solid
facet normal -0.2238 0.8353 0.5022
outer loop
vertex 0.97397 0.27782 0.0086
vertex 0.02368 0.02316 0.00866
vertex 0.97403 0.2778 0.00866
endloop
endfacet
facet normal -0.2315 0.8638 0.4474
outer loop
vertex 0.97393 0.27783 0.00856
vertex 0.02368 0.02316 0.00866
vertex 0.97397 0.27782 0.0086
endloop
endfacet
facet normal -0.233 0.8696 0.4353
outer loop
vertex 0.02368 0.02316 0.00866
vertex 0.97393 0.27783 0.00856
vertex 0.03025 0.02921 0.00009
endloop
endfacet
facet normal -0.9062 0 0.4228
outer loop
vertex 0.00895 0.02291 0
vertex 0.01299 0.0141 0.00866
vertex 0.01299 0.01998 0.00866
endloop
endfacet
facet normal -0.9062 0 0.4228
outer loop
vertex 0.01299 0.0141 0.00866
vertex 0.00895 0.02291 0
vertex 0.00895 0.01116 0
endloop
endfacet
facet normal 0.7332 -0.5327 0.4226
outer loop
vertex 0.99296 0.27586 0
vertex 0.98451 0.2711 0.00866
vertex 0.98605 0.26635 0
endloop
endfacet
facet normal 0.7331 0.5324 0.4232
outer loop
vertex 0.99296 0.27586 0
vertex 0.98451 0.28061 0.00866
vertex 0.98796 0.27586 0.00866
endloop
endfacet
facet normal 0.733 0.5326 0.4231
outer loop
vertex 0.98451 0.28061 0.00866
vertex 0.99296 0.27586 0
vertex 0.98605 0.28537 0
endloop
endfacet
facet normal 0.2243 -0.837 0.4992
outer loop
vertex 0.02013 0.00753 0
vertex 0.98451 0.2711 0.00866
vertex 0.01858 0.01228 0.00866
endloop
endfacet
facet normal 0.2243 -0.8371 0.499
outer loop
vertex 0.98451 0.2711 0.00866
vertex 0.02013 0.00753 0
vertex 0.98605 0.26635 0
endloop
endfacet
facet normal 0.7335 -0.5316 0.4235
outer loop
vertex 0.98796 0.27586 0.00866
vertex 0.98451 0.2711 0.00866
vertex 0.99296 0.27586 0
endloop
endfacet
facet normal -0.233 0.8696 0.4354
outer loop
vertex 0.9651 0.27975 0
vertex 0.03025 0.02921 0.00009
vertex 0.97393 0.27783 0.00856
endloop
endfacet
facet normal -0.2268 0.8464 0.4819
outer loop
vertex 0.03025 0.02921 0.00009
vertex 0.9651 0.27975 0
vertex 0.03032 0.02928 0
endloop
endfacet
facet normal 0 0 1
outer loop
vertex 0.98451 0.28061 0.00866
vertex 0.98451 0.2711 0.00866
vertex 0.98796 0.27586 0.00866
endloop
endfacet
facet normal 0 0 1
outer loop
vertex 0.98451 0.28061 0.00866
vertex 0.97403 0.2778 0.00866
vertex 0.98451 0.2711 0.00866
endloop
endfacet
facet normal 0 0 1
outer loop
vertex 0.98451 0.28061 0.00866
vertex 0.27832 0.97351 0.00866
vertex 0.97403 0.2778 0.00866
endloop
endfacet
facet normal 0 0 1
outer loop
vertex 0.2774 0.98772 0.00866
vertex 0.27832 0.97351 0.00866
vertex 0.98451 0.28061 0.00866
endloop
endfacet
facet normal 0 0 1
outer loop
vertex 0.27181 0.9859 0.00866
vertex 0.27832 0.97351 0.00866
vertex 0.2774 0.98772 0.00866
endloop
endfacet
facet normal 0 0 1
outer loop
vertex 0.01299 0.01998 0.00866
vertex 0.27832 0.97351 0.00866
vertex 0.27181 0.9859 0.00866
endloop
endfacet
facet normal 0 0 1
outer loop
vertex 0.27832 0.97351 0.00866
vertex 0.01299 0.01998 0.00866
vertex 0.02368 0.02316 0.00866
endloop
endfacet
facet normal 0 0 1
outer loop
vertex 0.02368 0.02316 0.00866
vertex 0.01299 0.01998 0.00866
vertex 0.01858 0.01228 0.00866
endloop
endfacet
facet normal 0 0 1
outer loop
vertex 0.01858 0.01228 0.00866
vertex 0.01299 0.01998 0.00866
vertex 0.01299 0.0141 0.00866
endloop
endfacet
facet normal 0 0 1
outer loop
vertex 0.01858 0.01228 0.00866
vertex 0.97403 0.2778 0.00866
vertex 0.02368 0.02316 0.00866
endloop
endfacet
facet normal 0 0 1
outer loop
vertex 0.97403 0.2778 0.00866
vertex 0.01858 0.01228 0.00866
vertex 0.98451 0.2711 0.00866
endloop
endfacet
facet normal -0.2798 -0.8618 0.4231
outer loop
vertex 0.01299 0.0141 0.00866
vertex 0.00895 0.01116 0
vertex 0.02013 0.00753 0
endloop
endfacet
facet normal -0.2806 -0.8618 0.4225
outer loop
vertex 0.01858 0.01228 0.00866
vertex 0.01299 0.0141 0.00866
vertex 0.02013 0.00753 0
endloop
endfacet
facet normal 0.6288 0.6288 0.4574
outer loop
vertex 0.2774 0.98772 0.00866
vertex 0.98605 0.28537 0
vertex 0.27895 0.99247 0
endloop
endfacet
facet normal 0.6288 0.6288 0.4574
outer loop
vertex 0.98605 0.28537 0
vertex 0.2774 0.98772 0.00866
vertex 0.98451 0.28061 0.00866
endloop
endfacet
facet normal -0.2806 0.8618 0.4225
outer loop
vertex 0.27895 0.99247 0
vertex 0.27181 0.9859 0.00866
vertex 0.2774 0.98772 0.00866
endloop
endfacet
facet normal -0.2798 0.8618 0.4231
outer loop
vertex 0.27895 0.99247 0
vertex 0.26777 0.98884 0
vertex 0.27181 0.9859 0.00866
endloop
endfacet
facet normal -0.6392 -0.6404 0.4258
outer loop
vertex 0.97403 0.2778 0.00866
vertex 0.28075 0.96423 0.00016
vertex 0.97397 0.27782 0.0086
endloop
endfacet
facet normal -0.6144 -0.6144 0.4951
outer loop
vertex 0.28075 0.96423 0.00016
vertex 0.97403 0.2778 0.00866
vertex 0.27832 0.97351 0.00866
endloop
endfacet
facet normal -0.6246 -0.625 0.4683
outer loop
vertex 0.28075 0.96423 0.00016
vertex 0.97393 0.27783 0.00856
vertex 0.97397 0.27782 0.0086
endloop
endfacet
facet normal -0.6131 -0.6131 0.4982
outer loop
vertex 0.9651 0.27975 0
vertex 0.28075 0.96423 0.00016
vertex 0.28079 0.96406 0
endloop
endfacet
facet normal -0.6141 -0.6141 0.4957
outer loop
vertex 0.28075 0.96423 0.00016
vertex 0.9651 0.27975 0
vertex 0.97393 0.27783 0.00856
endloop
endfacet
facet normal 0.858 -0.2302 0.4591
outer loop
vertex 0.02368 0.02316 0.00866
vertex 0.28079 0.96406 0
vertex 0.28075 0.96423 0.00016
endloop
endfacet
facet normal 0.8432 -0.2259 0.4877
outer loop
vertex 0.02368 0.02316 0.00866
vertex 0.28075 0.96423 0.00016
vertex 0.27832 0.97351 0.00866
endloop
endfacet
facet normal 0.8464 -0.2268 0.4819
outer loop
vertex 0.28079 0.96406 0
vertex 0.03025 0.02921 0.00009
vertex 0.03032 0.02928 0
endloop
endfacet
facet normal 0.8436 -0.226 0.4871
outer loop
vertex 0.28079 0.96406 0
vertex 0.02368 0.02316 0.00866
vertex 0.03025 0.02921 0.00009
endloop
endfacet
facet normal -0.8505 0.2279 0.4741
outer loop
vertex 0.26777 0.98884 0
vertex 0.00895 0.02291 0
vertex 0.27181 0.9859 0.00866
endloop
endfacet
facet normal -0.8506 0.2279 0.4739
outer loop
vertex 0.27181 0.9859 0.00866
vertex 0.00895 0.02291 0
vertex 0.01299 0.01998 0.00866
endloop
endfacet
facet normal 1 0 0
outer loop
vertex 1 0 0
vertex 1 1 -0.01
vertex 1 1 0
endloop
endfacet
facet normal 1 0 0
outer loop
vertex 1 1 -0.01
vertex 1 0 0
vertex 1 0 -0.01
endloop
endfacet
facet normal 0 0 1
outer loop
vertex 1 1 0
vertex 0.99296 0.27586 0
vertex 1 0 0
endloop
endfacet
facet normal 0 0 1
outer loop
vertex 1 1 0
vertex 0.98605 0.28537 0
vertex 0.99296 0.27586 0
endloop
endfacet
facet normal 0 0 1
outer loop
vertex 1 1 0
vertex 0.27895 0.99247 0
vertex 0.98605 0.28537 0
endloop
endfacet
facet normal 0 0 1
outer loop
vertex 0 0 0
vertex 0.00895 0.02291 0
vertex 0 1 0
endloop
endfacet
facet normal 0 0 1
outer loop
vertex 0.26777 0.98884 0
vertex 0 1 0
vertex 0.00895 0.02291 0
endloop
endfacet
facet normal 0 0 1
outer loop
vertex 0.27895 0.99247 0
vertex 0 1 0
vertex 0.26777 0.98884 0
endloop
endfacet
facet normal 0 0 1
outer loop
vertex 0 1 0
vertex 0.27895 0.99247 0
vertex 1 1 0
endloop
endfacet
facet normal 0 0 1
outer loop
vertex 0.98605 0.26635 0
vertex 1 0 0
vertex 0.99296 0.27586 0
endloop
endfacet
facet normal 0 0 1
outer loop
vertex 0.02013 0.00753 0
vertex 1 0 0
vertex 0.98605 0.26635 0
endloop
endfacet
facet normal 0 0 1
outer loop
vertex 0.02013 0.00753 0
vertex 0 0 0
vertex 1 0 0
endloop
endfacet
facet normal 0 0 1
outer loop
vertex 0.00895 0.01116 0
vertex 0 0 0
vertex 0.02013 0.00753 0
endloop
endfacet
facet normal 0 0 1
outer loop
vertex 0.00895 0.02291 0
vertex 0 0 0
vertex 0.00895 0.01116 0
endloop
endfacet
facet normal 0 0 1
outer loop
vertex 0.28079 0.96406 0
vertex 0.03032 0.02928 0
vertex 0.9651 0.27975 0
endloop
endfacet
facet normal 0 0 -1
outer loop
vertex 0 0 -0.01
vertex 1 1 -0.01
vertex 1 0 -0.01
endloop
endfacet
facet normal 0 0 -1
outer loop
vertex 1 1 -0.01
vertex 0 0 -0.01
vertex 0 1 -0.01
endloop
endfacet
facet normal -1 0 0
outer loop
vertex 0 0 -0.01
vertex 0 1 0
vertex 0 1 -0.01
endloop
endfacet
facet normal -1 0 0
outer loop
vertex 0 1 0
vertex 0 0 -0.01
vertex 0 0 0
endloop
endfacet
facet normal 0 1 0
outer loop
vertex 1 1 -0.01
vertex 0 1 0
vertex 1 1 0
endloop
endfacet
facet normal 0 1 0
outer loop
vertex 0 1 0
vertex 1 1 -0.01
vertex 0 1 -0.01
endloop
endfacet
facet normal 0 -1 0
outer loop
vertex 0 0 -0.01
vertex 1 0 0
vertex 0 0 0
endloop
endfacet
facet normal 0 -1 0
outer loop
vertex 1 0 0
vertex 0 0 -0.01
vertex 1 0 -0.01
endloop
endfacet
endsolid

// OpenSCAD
hull(){
    translate([0.0170370869, 0.0170370869]) sphere(0.01);
    translate([0.9829629131, 0.275856132]) sphere(0.01);
}
hull(){
    translate([0.9829629131, 0.275856132]) sphere(0.01);
    translate([0.275856132, 0.9829629131]) sphere(0.01);
}
hull(){
    translate([0.275856132, 0.9829629131]) sphere(0.01);
    translate([0.0170370869, 0.0170370869]) sphere(0.01);
}
translate([0,0,-0.01]) color([0.1,0.1,0.1]) cube([1,1,0.01]);
